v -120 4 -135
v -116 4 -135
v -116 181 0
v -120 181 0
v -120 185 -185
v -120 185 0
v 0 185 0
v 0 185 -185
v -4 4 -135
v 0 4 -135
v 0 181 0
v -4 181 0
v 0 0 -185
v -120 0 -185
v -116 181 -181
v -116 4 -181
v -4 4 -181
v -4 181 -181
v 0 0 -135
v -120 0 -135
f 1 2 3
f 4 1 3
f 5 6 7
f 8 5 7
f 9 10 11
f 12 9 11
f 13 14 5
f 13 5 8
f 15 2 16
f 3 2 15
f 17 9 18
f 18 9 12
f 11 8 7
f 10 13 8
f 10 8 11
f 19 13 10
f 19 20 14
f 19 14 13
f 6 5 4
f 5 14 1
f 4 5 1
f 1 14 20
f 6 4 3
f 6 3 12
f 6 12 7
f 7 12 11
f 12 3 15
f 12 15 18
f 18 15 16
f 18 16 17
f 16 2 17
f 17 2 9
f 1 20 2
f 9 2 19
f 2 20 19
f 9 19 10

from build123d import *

# Parameters (mm, degrees)
F0_W     = 120
F0_H     = 185
F1_DEPTH = 185
F3_DEPTH = 120
F4_W     = 112
F4_H     = 177
F5_DEPTH = 181


with BuildPart() as f1:
    # F0 (on Front) → F1 (new body)
    with BuildSketch(Plane.XZ):
        with Locations((-60, -92.5)):
            Rectangle(F0_W, F0_H)
    extrude(amount=-F1_DEPTH)

    # F2 (on face) → F3 (cut, through all)
    with BuildSketch(Plane.YZ):
        Polygon((4, -135), (181, 0), (0, 0), (0, -135), align=None)
    extrude(amount=-F3_DEPTH, mode=Mode.SUBTRACT)

    # F4 (on Top) → F5 (cut)
    with BuildSketch(Plane.XY):
        with Locations((-60, 92.5)):
            Rectangle(F4_W, F4_H)
    extrude(amount=-F5_DEPTH, mode=Mode.SUBTRACT)


solid = f1.part
